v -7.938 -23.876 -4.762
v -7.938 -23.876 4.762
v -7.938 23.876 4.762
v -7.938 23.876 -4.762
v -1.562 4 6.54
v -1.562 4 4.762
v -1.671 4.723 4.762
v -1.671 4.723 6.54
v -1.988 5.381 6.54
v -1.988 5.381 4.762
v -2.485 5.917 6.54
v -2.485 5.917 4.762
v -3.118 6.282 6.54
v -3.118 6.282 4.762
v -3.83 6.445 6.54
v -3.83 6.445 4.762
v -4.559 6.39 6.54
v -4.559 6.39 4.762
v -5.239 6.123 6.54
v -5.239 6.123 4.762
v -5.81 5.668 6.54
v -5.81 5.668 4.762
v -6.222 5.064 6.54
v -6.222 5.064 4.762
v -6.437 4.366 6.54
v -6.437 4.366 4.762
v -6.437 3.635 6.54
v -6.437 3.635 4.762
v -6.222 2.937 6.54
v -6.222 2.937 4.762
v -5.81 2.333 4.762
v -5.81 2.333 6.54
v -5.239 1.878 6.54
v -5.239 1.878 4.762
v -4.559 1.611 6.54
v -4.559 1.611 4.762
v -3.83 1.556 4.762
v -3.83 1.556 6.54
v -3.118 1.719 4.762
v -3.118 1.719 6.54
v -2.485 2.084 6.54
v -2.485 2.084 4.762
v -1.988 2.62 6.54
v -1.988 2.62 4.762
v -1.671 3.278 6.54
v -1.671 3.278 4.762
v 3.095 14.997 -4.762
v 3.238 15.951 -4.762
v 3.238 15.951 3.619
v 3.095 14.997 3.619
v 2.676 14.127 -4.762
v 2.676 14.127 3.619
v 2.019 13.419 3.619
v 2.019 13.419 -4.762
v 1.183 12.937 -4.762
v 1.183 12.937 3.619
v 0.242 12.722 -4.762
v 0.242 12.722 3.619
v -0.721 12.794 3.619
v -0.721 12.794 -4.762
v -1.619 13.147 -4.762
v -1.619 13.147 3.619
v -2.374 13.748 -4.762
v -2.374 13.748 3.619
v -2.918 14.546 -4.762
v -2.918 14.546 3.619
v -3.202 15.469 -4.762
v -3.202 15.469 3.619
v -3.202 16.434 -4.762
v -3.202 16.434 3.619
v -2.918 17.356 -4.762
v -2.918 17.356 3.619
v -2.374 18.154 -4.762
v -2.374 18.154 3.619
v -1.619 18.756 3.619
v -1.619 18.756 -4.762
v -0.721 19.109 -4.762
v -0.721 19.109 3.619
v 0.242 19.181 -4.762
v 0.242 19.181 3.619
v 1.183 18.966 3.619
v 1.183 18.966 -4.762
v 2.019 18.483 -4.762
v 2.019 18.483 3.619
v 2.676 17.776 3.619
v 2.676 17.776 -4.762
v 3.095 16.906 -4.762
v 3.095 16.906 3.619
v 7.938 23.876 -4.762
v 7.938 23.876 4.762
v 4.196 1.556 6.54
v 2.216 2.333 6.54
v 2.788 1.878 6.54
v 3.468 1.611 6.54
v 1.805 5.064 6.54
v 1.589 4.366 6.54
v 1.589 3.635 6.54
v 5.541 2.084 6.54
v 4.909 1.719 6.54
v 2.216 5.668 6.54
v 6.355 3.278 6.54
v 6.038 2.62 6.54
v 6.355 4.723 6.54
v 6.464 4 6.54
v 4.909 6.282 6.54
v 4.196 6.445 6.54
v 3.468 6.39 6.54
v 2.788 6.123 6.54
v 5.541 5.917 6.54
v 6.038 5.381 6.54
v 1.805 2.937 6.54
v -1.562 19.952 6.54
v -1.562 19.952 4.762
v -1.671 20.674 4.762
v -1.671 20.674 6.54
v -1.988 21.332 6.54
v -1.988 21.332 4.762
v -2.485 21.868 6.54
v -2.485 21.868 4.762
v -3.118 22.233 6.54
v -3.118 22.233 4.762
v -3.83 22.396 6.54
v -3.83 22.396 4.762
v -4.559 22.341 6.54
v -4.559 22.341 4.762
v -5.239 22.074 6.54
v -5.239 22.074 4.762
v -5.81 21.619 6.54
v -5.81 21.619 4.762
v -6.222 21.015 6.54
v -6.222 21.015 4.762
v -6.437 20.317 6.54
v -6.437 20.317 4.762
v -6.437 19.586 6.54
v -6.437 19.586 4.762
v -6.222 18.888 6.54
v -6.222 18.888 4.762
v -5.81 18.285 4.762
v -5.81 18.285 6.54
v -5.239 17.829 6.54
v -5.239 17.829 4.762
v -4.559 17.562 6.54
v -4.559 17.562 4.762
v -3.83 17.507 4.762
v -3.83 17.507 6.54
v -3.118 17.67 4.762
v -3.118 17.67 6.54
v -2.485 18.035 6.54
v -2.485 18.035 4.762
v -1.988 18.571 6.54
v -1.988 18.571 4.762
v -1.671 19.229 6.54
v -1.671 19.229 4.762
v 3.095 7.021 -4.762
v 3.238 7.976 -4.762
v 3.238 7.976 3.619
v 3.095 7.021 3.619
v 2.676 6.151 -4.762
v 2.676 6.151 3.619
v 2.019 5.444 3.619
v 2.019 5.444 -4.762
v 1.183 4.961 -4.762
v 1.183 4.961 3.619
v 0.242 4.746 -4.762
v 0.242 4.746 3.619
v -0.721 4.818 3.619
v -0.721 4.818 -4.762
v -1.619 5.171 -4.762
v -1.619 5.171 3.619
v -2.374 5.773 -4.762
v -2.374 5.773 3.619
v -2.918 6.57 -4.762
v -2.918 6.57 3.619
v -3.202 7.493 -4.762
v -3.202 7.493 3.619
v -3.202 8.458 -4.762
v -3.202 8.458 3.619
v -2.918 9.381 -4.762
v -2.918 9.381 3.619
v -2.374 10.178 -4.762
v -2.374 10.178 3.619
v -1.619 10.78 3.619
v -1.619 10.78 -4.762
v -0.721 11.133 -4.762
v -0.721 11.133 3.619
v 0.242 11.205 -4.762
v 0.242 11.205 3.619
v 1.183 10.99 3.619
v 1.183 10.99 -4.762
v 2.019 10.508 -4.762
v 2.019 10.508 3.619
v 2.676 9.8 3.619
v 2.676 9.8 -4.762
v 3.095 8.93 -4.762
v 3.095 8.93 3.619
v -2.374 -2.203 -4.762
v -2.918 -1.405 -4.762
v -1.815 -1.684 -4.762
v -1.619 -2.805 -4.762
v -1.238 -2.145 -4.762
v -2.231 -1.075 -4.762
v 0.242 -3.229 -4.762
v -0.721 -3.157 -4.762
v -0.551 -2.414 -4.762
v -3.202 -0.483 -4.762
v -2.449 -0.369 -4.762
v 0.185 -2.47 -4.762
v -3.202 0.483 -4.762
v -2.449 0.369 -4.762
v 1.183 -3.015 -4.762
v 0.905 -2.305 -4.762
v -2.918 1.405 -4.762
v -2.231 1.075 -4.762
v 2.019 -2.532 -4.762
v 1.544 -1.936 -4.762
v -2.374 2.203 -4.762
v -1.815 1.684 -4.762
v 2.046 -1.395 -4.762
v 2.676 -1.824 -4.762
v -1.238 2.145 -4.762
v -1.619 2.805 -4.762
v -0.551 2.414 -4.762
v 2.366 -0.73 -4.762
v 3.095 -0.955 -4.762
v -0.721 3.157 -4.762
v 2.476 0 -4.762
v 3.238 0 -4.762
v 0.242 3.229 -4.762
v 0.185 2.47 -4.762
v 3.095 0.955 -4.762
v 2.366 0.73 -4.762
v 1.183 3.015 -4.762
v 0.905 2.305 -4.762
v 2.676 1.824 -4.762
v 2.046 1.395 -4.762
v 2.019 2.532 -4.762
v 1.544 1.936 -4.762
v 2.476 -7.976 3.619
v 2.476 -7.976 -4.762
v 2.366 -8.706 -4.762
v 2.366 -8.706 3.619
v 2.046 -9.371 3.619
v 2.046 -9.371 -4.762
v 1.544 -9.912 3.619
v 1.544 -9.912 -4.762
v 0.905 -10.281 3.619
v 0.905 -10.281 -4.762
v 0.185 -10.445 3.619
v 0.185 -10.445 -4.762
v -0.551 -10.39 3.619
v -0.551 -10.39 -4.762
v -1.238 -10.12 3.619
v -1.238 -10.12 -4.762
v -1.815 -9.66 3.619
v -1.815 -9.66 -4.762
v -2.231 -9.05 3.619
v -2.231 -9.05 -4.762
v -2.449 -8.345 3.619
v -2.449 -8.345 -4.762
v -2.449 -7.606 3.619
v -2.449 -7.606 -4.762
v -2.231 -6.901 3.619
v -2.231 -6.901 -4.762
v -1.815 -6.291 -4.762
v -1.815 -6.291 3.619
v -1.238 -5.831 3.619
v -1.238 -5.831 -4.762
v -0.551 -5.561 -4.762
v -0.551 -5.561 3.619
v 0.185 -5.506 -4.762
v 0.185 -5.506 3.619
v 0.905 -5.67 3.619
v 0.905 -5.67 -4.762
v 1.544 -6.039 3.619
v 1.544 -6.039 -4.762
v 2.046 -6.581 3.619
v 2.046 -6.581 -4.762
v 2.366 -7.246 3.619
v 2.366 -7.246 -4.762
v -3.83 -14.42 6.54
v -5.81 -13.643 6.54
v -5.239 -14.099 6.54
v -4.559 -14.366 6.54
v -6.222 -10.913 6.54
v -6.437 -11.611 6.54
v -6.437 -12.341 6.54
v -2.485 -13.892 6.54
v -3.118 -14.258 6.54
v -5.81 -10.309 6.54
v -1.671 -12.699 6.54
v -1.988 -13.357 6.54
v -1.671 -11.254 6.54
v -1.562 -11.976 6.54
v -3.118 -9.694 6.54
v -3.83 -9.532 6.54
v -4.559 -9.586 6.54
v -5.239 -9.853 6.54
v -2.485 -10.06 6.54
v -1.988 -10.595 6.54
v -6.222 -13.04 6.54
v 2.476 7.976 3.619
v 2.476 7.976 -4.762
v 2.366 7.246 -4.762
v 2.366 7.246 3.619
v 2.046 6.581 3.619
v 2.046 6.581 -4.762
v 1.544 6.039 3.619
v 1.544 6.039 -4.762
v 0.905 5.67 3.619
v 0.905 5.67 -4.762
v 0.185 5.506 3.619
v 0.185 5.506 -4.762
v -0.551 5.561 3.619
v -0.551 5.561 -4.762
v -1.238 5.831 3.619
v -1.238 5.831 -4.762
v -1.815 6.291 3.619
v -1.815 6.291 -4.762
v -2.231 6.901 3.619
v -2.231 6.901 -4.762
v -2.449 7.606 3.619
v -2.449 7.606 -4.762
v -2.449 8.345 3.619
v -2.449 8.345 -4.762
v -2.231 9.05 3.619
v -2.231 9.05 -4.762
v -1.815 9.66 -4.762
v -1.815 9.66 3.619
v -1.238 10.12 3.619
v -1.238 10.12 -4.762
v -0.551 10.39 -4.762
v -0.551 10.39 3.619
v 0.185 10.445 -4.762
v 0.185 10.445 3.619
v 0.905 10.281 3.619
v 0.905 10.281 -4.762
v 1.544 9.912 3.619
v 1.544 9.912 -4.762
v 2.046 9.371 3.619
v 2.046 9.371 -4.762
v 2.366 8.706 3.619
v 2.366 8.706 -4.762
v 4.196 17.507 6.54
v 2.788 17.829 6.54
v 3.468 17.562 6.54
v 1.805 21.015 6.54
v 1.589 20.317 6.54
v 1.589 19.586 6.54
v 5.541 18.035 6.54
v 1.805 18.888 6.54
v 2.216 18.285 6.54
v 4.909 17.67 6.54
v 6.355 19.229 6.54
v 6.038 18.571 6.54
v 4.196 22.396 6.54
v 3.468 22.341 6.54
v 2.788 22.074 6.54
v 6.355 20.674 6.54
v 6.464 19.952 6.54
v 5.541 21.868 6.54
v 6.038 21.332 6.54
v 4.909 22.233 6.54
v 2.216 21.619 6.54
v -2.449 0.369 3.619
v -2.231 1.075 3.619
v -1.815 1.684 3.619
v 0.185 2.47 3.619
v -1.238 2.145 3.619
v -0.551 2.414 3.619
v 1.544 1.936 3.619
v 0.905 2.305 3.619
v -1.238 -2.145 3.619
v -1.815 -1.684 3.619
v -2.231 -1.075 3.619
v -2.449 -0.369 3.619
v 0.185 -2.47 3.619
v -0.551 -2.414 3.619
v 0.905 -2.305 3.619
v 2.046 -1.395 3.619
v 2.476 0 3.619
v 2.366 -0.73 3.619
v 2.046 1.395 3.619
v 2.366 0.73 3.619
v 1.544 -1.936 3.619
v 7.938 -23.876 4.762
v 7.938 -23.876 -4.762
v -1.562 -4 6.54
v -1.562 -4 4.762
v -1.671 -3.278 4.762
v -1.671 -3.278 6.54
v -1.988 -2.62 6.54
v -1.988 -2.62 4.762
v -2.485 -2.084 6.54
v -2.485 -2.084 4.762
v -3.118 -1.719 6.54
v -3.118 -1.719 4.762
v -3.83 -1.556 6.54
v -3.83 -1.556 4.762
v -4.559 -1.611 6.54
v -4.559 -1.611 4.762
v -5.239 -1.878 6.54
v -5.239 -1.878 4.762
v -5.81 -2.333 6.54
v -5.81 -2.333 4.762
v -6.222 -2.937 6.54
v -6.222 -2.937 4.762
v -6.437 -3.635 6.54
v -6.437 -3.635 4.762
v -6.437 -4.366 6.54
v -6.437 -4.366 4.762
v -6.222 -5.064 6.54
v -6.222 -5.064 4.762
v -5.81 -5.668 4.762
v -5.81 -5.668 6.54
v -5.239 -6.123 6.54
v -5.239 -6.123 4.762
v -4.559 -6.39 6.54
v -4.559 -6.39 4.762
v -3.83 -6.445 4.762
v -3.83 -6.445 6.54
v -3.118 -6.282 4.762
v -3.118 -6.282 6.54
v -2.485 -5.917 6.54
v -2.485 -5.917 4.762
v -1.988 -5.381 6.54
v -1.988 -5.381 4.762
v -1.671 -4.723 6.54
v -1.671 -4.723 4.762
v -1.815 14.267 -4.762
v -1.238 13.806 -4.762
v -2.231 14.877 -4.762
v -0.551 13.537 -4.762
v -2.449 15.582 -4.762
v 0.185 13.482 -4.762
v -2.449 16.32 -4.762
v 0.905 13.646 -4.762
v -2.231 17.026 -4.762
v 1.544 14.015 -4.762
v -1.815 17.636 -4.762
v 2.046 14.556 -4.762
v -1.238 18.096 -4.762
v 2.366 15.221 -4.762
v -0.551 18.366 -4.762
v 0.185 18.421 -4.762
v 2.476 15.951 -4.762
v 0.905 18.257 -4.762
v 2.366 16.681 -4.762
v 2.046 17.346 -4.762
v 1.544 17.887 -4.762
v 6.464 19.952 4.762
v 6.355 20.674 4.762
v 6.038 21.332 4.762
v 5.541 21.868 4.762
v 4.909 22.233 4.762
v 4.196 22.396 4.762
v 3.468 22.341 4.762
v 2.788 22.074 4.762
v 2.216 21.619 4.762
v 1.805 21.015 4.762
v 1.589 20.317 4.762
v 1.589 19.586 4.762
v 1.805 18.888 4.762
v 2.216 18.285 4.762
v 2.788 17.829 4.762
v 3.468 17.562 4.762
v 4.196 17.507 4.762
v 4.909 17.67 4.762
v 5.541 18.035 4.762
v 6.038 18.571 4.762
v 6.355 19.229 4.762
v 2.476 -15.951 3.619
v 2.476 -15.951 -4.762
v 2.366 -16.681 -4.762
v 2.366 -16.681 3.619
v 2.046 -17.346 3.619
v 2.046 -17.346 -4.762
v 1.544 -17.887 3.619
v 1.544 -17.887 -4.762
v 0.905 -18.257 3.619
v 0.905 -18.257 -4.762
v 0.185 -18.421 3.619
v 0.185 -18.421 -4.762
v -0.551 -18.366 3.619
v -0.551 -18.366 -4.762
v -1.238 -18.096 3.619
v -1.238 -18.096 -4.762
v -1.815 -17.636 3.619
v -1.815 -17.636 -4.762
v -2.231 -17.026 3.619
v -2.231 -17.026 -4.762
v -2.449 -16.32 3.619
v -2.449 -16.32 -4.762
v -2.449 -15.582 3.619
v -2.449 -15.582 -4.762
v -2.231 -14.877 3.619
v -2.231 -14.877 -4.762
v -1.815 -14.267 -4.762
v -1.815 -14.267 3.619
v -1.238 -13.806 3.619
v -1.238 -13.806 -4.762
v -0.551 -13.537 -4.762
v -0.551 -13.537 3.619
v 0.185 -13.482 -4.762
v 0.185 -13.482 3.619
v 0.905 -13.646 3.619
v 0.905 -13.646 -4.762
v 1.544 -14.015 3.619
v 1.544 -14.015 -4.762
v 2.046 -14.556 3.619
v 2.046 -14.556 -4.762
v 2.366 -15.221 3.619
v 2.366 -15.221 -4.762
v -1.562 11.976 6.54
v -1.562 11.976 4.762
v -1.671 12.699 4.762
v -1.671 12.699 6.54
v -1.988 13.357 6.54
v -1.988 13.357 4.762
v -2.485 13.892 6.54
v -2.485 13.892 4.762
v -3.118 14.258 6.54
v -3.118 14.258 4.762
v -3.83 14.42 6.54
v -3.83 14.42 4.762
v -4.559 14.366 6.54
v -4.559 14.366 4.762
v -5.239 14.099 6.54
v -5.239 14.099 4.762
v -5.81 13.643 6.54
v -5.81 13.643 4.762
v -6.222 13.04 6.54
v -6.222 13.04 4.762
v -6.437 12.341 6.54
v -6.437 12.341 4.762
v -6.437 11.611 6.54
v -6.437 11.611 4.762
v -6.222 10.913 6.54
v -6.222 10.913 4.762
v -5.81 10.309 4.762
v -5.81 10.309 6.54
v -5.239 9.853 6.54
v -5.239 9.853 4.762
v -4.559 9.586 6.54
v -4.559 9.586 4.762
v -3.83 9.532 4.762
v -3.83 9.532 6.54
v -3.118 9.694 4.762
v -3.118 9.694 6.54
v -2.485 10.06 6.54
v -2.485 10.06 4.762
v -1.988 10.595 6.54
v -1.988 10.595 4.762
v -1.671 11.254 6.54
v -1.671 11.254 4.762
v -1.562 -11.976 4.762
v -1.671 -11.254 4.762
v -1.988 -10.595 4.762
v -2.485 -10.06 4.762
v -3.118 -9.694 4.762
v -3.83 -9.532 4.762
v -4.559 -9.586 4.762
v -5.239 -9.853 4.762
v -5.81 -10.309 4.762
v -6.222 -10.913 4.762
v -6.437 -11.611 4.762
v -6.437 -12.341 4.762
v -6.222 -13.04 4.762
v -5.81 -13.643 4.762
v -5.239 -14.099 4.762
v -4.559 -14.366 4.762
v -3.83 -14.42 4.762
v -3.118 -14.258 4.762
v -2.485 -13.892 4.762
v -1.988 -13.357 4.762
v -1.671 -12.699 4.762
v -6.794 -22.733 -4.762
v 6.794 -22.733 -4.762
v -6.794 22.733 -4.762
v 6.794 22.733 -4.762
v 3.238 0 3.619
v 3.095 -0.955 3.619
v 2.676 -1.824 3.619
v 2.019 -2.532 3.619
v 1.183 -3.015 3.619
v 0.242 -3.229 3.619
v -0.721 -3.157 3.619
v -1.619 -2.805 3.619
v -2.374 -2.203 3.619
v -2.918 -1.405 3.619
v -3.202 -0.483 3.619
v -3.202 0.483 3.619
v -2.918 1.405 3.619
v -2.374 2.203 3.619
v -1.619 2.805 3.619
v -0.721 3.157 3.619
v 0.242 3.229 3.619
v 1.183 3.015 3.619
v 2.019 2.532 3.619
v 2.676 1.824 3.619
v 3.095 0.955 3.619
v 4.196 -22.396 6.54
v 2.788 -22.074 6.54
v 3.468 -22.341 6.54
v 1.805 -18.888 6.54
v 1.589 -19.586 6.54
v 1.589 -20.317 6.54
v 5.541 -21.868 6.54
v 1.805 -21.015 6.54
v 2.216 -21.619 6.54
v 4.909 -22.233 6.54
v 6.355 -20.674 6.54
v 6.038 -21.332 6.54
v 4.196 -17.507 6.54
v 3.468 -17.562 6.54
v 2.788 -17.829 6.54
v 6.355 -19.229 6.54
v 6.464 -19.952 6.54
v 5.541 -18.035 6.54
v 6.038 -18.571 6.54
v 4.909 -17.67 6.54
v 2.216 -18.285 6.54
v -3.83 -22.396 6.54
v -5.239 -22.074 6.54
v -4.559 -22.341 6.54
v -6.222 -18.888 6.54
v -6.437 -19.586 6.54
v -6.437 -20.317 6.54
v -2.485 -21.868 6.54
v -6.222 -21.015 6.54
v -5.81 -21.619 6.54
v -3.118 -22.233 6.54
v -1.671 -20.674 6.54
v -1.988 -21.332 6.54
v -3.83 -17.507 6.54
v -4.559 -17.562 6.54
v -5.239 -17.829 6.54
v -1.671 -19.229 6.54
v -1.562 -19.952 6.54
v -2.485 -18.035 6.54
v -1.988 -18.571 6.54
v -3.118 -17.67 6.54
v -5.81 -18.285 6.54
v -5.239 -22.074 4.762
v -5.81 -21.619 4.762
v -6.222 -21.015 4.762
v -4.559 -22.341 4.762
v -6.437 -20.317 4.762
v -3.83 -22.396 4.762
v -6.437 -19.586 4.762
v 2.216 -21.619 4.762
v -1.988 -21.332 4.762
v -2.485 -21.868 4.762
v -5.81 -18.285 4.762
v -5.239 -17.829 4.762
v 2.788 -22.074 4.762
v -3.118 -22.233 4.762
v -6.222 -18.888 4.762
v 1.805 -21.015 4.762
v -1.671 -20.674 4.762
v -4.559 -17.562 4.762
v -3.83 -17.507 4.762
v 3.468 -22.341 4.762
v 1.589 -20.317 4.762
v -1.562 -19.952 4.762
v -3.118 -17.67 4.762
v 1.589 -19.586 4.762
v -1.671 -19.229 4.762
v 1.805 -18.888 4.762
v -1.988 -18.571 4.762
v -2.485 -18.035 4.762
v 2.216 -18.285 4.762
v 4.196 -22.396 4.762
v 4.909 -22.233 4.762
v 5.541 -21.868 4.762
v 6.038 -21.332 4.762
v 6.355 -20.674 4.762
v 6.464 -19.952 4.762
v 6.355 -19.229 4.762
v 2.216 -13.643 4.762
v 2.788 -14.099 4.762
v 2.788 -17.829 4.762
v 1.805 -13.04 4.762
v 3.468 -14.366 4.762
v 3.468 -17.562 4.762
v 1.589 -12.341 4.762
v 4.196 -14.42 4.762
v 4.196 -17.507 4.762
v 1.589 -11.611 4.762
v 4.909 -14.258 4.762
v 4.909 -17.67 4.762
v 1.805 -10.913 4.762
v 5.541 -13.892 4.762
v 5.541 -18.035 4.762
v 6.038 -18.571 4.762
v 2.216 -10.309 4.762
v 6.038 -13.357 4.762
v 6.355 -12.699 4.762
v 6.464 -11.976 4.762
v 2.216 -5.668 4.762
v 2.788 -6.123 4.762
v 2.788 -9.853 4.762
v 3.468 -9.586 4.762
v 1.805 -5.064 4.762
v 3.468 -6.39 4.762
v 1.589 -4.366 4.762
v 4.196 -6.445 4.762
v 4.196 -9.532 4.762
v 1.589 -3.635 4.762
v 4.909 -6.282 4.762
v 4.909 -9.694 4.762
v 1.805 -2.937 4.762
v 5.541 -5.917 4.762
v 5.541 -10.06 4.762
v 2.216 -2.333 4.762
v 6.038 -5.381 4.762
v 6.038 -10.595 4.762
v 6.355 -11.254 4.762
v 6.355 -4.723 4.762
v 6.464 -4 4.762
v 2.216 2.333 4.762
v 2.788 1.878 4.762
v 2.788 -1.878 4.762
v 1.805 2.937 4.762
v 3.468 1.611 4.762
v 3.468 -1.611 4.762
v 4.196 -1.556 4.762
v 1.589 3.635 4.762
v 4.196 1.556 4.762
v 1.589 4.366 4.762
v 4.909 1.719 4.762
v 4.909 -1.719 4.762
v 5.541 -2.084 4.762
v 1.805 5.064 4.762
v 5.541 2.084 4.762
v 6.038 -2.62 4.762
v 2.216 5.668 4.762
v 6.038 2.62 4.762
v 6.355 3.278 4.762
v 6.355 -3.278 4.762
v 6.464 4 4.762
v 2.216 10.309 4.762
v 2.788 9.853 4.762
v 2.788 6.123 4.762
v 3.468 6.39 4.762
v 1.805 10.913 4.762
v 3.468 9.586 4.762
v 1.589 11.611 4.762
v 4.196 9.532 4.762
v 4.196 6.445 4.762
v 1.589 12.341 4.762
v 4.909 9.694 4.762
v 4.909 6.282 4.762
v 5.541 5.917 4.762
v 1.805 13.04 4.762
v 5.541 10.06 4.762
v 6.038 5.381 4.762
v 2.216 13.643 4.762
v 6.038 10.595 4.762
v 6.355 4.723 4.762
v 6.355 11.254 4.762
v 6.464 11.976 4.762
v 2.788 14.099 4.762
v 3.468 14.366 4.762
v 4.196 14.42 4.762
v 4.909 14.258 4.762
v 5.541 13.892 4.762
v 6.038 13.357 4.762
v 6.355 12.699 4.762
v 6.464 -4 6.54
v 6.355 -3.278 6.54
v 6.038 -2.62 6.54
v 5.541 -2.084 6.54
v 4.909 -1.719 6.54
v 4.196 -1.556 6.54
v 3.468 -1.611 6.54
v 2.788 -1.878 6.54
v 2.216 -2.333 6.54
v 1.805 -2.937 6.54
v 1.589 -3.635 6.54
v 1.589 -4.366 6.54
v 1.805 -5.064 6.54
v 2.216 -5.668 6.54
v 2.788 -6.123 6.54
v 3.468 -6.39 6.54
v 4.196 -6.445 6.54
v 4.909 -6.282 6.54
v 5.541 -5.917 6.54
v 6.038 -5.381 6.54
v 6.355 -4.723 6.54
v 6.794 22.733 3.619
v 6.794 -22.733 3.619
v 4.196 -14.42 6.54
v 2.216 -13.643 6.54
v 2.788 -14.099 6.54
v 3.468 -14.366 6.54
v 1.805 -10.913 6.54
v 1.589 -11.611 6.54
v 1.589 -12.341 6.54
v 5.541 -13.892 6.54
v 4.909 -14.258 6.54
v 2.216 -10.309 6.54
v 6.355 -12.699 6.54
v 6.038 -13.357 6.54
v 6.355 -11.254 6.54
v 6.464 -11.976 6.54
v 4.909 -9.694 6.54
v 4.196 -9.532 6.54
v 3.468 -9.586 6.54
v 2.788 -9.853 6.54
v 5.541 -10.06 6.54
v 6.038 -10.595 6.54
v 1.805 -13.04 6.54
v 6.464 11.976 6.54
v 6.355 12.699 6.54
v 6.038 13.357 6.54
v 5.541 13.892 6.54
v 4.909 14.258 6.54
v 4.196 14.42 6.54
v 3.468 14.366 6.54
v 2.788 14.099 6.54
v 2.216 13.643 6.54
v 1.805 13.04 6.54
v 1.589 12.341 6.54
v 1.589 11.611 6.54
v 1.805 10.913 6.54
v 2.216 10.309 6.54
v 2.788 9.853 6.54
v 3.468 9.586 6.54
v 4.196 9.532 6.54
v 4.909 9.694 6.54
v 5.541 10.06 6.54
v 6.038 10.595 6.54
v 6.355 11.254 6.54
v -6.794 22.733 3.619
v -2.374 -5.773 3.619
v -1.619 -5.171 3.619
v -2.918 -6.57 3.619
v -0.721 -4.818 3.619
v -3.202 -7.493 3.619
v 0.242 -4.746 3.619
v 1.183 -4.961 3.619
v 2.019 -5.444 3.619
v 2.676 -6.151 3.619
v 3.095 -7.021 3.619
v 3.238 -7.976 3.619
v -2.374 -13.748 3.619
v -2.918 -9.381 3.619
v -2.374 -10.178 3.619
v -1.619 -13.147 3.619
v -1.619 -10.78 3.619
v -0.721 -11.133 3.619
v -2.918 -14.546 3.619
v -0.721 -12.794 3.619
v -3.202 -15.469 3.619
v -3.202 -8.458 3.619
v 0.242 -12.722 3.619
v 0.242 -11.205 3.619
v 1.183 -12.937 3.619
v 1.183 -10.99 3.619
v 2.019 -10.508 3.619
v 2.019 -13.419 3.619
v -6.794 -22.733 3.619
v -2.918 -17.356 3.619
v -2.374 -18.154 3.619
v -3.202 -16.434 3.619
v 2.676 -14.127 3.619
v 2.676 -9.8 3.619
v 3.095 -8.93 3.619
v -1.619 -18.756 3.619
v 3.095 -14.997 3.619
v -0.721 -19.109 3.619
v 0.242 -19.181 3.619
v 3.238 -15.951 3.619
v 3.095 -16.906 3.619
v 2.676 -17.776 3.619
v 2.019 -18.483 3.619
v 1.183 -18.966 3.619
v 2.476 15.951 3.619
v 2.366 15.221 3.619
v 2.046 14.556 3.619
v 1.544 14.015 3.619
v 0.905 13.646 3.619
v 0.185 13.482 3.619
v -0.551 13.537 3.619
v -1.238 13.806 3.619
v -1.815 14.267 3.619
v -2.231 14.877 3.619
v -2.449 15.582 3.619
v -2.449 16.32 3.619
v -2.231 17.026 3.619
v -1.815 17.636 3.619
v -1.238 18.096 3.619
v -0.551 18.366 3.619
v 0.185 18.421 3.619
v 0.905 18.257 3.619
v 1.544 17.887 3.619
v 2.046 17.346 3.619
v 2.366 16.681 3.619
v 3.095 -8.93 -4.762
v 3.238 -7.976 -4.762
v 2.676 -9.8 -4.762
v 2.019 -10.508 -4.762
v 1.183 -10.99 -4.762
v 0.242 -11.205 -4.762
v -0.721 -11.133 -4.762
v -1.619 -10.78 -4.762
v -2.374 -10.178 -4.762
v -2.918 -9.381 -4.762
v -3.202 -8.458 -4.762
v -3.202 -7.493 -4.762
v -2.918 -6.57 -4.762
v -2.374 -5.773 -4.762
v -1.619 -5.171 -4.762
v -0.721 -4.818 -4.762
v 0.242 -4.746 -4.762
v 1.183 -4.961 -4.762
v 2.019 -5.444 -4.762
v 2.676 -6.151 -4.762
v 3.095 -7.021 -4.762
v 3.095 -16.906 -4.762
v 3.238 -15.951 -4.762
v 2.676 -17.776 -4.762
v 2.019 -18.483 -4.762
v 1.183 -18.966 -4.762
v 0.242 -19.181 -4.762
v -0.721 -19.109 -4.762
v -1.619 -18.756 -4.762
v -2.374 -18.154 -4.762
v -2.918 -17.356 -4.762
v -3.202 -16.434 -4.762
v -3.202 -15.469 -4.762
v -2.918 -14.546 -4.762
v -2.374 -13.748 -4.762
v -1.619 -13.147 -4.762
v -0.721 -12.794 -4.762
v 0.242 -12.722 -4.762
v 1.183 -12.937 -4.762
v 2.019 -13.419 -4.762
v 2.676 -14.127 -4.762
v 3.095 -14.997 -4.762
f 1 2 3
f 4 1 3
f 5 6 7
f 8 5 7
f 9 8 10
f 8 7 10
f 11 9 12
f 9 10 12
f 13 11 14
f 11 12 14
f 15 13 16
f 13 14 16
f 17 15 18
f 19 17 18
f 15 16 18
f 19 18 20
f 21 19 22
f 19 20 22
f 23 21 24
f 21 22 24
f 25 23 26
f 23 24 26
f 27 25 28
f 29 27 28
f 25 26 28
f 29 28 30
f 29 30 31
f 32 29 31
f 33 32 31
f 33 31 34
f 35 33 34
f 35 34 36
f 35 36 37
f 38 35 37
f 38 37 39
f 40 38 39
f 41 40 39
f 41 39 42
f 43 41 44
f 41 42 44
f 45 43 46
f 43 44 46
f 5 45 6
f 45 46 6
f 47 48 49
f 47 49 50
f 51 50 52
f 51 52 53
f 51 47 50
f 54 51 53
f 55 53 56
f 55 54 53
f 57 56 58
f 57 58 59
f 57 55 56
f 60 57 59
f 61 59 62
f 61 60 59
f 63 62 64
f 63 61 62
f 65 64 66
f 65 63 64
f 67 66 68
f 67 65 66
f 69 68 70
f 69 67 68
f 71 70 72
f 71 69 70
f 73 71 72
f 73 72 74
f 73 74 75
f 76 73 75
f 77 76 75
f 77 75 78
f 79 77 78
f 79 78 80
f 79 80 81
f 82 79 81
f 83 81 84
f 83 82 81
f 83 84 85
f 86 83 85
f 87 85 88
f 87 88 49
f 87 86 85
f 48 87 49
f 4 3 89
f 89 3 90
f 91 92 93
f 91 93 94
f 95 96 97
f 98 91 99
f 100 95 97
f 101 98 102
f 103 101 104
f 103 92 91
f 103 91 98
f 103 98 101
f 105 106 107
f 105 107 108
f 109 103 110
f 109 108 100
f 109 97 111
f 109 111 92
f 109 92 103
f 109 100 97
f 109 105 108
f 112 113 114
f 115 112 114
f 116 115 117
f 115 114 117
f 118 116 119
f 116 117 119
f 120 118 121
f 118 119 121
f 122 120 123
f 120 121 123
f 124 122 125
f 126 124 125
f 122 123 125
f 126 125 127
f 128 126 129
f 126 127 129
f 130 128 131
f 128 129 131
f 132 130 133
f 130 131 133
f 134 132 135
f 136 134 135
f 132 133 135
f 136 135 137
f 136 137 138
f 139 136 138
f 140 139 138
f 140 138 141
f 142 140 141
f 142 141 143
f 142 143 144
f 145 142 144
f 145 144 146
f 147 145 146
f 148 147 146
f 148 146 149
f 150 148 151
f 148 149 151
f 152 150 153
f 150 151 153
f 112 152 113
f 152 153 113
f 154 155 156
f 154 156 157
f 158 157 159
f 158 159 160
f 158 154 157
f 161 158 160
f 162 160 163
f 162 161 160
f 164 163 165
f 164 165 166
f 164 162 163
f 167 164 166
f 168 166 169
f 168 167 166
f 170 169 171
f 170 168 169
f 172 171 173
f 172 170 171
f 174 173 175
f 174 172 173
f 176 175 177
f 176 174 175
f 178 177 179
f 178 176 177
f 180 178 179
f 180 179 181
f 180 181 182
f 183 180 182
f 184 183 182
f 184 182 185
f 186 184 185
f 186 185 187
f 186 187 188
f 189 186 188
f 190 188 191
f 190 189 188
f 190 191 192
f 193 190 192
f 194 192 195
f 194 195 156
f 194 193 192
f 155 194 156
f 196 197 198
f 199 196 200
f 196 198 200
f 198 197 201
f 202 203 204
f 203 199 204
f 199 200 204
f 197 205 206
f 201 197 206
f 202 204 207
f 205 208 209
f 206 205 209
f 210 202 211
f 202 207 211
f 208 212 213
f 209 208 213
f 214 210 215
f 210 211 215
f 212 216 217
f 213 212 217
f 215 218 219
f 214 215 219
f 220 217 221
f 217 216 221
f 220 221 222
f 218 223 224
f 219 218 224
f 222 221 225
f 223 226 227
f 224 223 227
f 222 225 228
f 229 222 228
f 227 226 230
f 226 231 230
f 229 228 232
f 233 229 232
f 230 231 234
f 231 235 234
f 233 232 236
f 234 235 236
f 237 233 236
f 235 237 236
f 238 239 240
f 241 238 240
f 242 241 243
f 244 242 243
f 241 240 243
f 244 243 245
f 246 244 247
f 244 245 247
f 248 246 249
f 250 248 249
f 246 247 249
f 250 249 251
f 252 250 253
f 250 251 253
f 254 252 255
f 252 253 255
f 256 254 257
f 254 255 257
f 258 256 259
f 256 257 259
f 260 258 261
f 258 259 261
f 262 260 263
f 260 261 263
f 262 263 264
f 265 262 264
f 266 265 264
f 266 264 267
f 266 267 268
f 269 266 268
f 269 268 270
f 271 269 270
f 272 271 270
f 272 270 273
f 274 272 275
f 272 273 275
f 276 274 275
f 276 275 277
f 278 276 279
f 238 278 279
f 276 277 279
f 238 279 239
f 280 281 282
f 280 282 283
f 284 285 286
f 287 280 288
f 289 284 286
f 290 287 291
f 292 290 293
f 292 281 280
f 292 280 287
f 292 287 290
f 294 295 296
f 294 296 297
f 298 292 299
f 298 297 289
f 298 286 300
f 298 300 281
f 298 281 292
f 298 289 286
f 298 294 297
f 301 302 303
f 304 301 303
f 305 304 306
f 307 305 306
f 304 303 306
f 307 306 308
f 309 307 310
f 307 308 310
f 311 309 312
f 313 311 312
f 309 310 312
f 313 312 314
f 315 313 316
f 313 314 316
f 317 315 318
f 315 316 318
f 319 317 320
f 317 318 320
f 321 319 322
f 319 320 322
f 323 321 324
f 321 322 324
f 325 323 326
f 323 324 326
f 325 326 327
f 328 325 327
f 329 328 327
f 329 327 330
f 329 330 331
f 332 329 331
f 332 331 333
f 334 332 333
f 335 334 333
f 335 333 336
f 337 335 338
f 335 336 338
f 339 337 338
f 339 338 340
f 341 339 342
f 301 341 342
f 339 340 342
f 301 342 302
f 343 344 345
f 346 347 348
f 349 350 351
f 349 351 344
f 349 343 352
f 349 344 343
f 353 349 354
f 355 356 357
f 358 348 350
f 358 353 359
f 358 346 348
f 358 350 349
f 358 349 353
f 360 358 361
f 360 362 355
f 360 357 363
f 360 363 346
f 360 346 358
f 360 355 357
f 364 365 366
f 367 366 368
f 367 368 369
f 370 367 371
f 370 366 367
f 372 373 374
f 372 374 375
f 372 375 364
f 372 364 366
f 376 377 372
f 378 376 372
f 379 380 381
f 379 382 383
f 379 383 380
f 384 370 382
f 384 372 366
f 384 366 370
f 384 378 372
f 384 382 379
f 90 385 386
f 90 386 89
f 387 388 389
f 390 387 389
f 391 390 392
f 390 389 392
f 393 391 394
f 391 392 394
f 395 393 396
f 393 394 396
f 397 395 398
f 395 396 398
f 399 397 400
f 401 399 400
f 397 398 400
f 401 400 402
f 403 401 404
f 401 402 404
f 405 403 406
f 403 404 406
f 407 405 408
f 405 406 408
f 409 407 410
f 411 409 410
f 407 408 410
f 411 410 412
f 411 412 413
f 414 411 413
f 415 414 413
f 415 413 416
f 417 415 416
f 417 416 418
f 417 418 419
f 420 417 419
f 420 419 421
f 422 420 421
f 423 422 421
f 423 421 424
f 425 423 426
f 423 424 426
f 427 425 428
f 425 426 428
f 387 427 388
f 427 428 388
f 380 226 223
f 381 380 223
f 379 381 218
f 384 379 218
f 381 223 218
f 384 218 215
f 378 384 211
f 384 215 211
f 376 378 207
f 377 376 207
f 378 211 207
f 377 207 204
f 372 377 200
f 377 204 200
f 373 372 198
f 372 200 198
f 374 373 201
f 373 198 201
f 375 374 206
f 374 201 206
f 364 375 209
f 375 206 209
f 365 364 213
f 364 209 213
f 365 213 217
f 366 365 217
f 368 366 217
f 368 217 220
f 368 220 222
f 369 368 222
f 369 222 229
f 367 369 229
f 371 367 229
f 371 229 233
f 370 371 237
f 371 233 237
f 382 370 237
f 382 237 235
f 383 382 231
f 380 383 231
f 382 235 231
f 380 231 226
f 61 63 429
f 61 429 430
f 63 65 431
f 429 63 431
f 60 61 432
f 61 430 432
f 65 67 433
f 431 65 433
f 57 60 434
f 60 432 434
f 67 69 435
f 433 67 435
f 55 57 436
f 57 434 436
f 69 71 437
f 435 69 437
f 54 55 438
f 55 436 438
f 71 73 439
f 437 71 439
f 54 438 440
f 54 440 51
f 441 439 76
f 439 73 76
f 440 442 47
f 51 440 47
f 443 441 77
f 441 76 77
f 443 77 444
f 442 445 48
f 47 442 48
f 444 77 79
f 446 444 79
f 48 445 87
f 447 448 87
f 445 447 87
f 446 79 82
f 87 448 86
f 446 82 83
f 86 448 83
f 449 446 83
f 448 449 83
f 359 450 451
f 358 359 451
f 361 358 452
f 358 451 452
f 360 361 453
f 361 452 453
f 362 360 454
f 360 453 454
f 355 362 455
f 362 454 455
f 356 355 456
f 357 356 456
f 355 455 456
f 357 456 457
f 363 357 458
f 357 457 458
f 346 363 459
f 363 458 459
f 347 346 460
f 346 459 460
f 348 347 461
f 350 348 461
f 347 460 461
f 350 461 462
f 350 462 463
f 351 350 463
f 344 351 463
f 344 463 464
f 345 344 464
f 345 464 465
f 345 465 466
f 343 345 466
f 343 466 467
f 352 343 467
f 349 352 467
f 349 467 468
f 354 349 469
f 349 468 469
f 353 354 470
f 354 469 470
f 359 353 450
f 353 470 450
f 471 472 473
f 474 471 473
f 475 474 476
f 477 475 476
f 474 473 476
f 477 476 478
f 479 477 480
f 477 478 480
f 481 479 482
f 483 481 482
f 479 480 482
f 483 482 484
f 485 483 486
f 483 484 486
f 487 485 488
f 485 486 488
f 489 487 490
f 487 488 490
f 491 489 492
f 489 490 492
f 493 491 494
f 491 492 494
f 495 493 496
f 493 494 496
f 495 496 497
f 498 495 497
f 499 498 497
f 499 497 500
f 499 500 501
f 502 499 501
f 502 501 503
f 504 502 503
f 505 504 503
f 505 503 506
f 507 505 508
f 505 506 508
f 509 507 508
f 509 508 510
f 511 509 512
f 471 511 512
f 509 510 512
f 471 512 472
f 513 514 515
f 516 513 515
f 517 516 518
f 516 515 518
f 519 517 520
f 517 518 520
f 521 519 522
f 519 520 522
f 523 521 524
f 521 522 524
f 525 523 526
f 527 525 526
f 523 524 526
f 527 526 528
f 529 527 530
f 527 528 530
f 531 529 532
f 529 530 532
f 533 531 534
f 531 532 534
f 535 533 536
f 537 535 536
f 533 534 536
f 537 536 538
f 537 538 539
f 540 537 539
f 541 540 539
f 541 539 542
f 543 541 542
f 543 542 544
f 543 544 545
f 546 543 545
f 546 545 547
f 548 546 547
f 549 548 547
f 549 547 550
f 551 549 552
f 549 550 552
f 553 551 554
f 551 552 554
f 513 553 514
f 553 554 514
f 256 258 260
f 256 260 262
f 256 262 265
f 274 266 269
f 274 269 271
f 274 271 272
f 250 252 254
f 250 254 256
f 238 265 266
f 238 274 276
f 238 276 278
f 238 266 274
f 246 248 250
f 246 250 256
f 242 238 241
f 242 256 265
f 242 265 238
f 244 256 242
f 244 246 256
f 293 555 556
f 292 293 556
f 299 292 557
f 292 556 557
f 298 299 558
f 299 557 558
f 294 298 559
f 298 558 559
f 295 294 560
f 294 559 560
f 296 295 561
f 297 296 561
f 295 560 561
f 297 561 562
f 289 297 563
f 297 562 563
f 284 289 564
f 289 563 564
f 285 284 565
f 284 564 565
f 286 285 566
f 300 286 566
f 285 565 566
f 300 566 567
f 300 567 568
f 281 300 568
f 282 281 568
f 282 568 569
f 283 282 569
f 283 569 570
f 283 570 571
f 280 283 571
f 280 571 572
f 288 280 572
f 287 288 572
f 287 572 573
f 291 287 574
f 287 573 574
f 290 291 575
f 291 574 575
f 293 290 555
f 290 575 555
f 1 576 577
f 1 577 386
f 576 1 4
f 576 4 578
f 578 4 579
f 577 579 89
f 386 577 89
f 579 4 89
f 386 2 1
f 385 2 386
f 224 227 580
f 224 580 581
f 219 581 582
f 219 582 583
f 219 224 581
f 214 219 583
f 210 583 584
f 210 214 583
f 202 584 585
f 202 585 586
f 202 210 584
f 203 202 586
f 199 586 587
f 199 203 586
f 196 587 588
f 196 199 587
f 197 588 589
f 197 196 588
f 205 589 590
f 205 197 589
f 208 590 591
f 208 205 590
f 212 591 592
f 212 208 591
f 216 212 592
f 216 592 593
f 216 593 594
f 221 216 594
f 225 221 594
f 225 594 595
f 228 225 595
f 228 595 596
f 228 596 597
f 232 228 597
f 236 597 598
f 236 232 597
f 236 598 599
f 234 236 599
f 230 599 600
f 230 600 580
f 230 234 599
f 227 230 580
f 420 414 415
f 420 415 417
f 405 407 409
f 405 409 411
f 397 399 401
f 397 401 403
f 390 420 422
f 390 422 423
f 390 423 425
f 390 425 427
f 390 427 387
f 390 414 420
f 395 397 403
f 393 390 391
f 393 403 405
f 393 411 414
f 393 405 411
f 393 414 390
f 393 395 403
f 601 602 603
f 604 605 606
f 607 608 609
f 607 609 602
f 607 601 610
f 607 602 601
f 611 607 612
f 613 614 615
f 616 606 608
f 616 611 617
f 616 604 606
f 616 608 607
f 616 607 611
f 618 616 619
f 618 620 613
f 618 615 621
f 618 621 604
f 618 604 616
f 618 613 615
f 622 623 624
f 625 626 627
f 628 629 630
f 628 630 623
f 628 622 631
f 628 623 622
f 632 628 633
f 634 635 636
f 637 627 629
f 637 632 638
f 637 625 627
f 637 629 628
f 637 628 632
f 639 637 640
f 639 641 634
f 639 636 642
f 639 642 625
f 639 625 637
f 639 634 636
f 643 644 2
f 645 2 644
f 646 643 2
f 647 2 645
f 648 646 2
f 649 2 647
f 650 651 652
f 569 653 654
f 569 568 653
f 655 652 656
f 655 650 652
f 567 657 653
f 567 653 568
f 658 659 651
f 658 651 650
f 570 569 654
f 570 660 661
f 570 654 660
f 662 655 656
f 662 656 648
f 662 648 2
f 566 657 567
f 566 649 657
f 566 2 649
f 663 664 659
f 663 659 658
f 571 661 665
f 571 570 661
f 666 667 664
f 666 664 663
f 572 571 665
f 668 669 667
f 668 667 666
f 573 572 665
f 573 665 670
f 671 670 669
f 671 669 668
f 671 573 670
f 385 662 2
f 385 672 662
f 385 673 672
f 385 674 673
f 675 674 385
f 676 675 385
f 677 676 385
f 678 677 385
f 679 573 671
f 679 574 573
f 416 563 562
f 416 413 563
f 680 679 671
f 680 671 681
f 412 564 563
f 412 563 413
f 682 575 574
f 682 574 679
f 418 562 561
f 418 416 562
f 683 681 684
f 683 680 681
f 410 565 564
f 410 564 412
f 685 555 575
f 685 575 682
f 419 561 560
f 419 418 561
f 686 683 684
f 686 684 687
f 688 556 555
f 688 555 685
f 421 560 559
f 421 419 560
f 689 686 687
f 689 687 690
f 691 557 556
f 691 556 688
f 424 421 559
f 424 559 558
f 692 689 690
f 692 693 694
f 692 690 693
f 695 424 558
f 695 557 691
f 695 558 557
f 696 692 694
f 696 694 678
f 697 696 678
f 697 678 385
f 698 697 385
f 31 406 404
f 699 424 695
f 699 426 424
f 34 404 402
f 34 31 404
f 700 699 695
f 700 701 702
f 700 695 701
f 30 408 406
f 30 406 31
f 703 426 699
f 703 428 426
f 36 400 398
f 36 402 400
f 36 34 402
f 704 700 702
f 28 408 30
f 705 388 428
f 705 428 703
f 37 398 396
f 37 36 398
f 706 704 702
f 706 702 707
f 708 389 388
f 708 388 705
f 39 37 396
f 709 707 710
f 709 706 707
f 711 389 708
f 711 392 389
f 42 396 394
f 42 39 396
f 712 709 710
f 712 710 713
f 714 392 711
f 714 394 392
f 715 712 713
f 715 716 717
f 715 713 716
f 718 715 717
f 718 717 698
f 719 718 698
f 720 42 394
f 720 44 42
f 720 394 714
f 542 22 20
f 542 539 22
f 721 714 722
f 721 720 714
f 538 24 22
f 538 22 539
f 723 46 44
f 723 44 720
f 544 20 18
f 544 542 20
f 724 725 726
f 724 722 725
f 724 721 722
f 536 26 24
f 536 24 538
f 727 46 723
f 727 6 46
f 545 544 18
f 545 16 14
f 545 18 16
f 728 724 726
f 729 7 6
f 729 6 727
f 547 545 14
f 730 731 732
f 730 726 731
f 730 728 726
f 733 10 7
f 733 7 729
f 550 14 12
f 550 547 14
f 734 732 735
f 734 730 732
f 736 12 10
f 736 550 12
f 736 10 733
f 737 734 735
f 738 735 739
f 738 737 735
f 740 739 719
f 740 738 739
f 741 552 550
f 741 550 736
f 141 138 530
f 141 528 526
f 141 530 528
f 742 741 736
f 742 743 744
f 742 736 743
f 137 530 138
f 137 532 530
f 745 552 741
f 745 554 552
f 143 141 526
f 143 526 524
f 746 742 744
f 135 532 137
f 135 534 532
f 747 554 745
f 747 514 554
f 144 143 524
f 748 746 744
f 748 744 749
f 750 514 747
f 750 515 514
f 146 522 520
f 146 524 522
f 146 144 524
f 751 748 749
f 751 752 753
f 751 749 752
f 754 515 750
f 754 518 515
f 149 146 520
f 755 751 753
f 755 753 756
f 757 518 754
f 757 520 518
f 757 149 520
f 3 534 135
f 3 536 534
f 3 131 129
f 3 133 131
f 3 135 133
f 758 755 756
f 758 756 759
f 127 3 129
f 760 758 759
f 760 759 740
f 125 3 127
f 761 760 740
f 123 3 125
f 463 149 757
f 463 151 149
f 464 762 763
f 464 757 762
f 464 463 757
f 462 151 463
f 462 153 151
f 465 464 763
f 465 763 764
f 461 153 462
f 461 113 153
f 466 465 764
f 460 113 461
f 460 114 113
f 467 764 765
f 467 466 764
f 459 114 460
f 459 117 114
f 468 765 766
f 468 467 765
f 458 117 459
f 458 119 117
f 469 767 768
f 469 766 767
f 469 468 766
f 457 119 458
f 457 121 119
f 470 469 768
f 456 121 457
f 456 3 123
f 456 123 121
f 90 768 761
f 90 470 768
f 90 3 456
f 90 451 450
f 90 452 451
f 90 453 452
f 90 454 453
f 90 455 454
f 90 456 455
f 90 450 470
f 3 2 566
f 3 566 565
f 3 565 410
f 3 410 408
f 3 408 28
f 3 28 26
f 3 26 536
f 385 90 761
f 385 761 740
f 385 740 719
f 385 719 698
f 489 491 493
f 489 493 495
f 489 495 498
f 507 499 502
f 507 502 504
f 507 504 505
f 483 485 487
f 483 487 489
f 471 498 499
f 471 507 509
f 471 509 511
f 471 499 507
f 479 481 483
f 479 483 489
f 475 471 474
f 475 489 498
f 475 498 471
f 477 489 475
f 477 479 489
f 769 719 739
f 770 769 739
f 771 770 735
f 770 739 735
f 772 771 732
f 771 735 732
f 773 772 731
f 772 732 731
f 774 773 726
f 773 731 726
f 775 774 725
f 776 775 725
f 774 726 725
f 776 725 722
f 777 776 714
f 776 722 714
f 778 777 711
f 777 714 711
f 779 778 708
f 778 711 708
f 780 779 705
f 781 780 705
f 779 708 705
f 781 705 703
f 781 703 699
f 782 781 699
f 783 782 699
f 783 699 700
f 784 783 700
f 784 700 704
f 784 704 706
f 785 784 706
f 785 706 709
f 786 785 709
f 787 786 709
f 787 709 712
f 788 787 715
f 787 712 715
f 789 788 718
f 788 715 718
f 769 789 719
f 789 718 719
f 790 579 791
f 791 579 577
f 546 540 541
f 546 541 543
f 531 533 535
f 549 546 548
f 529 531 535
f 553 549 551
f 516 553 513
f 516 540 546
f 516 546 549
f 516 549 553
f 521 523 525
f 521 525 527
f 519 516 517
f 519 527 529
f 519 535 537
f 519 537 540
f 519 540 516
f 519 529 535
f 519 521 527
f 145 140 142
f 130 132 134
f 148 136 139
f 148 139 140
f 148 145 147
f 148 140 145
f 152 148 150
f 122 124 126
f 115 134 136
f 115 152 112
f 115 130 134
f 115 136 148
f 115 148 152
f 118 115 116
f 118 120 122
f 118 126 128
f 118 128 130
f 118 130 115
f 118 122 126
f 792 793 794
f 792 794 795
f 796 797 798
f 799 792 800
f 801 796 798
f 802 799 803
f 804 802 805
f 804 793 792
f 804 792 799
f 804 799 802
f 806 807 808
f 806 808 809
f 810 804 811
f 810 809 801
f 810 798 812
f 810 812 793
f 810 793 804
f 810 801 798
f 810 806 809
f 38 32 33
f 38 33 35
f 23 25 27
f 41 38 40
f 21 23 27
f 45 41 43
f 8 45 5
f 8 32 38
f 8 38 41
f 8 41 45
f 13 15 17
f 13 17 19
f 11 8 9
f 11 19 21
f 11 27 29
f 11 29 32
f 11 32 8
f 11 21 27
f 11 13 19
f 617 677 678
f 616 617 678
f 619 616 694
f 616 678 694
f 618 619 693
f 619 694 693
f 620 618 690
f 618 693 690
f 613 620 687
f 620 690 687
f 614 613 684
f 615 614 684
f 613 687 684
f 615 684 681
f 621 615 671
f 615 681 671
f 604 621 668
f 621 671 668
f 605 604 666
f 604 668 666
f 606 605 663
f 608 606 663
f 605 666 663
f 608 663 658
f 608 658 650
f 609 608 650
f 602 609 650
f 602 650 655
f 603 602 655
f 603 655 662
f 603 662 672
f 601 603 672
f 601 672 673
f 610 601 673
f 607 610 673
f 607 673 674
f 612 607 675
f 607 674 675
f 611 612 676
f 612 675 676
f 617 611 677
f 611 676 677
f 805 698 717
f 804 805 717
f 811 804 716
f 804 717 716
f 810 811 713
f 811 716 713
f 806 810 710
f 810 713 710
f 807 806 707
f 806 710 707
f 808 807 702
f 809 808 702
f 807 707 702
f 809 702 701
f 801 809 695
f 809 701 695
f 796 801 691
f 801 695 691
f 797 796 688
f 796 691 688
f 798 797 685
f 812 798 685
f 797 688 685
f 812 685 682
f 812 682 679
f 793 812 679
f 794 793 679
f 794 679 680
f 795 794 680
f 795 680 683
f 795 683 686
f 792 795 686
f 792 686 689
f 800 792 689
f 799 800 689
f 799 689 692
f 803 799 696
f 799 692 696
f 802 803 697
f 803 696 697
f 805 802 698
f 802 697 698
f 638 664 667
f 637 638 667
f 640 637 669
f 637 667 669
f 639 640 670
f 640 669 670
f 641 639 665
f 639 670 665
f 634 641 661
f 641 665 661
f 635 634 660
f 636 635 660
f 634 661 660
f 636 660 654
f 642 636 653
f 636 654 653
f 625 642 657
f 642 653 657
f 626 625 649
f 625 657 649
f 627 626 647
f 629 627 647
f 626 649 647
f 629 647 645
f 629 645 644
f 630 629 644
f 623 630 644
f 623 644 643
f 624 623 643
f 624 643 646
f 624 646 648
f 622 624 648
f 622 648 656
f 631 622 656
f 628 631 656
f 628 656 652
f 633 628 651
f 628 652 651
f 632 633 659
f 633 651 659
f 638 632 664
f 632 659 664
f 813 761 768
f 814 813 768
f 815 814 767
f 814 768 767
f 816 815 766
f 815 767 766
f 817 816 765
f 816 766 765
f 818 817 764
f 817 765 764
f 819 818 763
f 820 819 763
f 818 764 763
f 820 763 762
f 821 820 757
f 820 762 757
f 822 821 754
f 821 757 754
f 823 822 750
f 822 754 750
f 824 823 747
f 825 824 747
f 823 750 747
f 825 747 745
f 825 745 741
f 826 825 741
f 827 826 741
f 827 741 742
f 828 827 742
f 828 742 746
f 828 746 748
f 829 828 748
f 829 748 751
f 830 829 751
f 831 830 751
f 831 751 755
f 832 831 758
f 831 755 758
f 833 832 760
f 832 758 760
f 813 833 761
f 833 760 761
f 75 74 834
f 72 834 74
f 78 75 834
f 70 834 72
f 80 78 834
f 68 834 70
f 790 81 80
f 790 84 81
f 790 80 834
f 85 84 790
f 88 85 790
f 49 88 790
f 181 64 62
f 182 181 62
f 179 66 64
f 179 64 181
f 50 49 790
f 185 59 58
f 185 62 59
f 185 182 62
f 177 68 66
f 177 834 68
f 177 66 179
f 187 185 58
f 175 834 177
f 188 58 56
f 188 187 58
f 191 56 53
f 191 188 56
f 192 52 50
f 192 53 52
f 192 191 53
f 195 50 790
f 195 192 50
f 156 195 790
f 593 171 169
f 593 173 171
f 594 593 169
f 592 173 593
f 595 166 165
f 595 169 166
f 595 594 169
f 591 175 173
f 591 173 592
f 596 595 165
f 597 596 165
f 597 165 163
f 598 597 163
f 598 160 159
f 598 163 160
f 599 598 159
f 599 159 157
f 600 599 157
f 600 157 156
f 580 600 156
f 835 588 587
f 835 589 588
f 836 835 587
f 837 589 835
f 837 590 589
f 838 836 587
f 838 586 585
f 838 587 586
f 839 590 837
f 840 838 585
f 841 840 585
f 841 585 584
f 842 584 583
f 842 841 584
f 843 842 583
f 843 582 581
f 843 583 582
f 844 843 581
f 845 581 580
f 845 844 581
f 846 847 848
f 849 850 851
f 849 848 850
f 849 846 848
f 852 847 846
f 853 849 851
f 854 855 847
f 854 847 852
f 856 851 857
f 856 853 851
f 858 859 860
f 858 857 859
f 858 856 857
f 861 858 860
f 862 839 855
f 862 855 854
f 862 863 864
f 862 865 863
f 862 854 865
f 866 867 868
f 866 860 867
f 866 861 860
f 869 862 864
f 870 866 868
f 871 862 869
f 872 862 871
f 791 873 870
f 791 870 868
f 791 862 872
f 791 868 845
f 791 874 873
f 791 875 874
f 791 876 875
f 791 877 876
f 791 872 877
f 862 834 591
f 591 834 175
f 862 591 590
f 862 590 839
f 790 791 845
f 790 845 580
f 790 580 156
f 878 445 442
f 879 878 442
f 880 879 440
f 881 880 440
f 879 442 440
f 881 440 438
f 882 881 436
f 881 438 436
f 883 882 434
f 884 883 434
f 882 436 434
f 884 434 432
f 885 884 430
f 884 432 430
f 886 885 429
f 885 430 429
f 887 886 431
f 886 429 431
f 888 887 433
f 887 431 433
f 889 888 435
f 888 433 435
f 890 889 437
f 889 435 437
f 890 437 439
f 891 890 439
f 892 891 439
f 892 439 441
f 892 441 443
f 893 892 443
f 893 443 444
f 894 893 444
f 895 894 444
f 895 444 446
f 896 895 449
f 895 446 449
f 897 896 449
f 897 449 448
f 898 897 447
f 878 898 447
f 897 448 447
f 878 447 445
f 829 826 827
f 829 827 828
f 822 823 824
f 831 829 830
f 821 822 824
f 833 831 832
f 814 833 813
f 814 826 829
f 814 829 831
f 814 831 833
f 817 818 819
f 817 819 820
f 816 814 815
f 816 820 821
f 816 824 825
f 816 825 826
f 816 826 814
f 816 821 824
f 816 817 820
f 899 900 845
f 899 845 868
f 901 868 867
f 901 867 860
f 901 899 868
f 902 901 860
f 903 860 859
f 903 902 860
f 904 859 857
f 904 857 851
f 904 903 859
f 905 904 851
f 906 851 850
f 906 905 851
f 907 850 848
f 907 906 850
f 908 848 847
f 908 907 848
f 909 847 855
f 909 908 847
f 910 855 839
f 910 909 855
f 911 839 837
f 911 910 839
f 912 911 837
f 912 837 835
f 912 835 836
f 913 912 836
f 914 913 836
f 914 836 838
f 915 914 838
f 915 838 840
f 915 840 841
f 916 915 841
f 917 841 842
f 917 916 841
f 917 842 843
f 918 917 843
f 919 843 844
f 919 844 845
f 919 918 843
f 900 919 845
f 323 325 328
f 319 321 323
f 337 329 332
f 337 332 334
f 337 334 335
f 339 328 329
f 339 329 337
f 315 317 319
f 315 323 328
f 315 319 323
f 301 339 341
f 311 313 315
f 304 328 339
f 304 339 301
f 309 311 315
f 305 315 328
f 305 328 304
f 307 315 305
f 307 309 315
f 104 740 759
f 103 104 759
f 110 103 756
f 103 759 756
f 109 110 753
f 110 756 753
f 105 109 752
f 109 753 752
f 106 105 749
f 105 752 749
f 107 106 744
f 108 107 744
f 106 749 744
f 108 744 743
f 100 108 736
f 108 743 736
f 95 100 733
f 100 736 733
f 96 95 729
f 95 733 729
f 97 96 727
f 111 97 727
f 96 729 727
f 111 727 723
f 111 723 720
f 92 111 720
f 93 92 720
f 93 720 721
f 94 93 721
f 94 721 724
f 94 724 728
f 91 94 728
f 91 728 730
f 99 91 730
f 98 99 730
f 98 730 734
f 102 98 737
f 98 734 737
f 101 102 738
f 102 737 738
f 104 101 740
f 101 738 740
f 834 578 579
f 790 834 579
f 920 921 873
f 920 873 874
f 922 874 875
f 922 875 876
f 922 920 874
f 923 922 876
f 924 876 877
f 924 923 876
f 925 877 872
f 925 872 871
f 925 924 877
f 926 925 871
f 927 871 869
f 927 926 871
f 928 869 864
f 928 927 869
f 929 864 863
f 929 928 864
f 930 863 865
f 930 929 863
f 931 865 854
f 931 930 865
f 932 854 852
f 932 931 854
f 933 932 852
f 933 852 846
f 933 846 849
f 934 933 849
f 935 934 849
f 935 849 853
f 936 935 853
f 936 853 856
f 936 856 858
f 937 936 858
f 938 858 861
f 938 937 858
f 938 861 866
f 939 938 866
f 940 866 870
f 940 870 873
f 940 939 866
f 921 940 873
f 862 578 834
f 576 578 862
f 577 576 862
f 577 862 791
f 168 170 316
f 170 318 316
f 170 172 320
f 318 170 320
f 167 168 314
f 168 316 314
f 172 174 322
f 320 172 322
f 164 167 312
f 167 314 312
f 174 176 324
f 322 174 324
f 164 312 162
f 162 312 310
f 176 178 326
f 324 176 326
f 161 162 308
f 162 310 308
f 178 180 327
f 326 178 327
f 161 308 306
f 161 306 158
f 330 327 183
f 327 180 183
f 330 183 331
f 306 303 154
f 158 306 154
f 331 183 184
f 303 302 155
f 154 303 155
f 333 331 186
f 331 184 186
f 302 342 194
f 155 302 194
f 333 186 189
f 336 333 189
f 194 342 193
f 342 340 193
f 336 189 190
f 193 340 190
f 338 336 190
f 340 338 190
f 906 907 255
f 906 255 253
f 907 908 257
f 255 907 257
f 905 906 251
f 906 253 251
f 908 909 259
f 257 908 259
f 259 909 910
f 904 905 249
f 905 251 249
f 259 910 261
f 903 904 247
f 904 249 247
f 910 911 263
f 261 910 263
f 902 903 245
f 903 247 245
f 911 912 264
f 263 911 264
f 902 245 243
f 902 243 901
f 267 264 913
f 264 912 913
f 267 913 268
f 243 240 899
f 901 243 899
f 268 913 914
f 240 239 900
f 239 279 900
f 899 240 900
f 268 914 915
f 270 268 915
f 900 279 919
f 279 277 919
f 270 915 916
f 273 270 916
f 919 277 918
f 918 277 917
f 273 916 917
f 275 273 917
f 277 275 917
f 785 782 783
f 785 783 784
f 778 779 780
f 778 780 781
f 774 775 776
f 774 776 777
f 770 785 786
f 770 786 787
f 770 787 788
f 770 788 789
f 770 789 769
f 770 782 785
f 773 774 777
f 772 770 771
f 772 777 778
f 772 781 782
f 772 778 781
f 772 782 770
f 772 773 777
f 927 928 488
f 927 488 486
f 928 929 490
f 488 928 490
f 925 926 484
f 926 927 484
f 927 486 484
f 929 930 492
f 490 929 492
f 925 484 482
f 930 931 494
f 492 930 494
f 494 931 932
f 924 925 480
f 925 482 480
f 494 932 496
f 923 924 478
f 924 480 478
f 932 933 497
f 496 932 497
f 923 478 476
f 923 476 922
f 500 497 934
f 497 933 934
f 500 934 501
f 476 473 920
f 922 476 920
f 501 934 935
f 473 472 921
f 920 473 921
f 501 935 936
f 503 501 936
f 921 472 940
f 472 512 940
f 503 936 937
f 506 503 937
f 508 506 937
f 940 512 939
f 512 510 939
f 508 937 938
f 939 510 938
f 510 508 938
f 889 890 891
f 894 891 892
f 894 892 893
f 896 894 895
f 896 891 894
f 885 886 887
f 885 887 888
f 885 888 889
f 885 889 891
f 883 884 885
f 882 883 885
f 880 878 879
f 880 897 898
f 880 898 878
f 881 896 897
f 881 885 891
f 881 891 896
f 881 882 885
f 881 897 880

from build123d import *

# Parameters (mm, degrees)
F0_W      = 15.875
F0_H      = 47.752
F1_DEPTH  = 4.7625
F2_R      = 2.4511
F3_DEPTH  = 1.778
F4_W      = 13.589
F4_H      = 45.466
F4_R      = 3.2385
F5_DEPTH  = 8.382
F8_R      = 2.4765
F7_R      = 2.4765
F6_R      = 2.4765
F9_R      = 2.4765
F10_R     = 2.4765
F11_DEPTH = 8.382


with BuildPart() as f1:
    # F0 (on Top) → F1 (new body, symmetric)
    with BuildSketch(Plane.XY):
        Rectangle(F0_W, F0_H)
    extrude(amount=F1_DEPTH, both=True)

    # F2 (on face) → F3 (join)
    with BuildSketch(Plane.XY.offset(4.7625)):
        with Locations((-4.0132, 19.9517)):
            Circle(F2_R)
        with Locations((4.0132, 19.9517)):
            Circle(F2_R)
        with Locations((-4.0132, 11.9761)):
            Circle(F2_R)
        with Locations((4.0132, 11.9761)):
            Circle(F2_R)
        with Locations((4.0132, 4.0005)):
            Circle(F2_R)
        with Locations((-4.0132, 4.0005)):
            Circle(F2_R)
        with Locations((-4.0132, -4.0005)):
            Circle(F2_R)
        with Locations((4.0132, -4.0005)):
            Circle(F2_R)
        with Locations((4.0132, -11.9761)):
            Circle(F2_R)
        with Locations((-4.0132, -11.9761)):
            Circle(F2_R)
        with Locations((-4.0132, -19.9517)):
            Circle(F2_R)
        with Locations((4.0132, -19.9517)):
            Circle(F2_R)
    extrude(amount=F3_DEPTH)

    # F4 (on face) → F5 (cut)
    with BuildSketch(Plane(origin=(0, 0, -4.7625), x_dir=(1, 0, 0), z_dir=(0, 0, -1))):
        Rectangle(F4_W, F4_H)
        with Locations((0, -15.9512)):
            Circle(F4_R, mode=Mode.SUBTRACT)
        with Locations((0, -7.9756)):
            Circle(F4_R, mode=Mode.SUBTRACT)
        Circle(F4_R, mode=Mode.SUBTRACT)
        with Locations((0, 7.9756)):
            Circle(F4_R, mode=Mode.SUBTRACT)
        with Locations((0, 15.9512)):
            Circle(F4_R, mode=Mode.SUBTRACT)
    extrude(amount=-F5_DEPTH, mode=Mode.SUBTRACT)

    # F8 (on face) + F7 (on face) + F6 (on face) + F9 (on face) + F10 (on face) → F11 (cut)
    with BuildSketch(Plane(origin=(0, 0, -4.7625), x_dir=(1, 0, 0), z_dir=(0, 0, -1))):
        with Locations((0, 15.9512)):
            Circle(F8_R)
    with BuildSketch(Plane(origin=(0, 0, -4.7625), x_dir=(1, 0, 0), z_dir=(0, 0, -1))):
        with Locations((0, 7.9756)):
            Circle(F7_R)
    with BuildSketch(Plane(origin=(0, 0, -4.7625), x_dir=(1, 0, 0), z_dir=(0, 0, -1))):
        Circle(F6_R)
    with BuildSketch(Plane(origin=(0, 0, -4.7625), x_dir=(1, 0, 0), z_dir=(0, 0, -1))):
        with Locations((0, -7.9756)):
            Circle(F9_R)
    with BuildSketch(Plane(origin=(0, 0, -4.7625), x_dir=(1, 0, 0), z_dir=(0, 0, -1))):
        with Locations((0, -15.9512)):
            Circle(F10_R)
    extrude(amount=-F11_DEPTH, mode=Mode.SUBTRACT)


solid = f1.part
